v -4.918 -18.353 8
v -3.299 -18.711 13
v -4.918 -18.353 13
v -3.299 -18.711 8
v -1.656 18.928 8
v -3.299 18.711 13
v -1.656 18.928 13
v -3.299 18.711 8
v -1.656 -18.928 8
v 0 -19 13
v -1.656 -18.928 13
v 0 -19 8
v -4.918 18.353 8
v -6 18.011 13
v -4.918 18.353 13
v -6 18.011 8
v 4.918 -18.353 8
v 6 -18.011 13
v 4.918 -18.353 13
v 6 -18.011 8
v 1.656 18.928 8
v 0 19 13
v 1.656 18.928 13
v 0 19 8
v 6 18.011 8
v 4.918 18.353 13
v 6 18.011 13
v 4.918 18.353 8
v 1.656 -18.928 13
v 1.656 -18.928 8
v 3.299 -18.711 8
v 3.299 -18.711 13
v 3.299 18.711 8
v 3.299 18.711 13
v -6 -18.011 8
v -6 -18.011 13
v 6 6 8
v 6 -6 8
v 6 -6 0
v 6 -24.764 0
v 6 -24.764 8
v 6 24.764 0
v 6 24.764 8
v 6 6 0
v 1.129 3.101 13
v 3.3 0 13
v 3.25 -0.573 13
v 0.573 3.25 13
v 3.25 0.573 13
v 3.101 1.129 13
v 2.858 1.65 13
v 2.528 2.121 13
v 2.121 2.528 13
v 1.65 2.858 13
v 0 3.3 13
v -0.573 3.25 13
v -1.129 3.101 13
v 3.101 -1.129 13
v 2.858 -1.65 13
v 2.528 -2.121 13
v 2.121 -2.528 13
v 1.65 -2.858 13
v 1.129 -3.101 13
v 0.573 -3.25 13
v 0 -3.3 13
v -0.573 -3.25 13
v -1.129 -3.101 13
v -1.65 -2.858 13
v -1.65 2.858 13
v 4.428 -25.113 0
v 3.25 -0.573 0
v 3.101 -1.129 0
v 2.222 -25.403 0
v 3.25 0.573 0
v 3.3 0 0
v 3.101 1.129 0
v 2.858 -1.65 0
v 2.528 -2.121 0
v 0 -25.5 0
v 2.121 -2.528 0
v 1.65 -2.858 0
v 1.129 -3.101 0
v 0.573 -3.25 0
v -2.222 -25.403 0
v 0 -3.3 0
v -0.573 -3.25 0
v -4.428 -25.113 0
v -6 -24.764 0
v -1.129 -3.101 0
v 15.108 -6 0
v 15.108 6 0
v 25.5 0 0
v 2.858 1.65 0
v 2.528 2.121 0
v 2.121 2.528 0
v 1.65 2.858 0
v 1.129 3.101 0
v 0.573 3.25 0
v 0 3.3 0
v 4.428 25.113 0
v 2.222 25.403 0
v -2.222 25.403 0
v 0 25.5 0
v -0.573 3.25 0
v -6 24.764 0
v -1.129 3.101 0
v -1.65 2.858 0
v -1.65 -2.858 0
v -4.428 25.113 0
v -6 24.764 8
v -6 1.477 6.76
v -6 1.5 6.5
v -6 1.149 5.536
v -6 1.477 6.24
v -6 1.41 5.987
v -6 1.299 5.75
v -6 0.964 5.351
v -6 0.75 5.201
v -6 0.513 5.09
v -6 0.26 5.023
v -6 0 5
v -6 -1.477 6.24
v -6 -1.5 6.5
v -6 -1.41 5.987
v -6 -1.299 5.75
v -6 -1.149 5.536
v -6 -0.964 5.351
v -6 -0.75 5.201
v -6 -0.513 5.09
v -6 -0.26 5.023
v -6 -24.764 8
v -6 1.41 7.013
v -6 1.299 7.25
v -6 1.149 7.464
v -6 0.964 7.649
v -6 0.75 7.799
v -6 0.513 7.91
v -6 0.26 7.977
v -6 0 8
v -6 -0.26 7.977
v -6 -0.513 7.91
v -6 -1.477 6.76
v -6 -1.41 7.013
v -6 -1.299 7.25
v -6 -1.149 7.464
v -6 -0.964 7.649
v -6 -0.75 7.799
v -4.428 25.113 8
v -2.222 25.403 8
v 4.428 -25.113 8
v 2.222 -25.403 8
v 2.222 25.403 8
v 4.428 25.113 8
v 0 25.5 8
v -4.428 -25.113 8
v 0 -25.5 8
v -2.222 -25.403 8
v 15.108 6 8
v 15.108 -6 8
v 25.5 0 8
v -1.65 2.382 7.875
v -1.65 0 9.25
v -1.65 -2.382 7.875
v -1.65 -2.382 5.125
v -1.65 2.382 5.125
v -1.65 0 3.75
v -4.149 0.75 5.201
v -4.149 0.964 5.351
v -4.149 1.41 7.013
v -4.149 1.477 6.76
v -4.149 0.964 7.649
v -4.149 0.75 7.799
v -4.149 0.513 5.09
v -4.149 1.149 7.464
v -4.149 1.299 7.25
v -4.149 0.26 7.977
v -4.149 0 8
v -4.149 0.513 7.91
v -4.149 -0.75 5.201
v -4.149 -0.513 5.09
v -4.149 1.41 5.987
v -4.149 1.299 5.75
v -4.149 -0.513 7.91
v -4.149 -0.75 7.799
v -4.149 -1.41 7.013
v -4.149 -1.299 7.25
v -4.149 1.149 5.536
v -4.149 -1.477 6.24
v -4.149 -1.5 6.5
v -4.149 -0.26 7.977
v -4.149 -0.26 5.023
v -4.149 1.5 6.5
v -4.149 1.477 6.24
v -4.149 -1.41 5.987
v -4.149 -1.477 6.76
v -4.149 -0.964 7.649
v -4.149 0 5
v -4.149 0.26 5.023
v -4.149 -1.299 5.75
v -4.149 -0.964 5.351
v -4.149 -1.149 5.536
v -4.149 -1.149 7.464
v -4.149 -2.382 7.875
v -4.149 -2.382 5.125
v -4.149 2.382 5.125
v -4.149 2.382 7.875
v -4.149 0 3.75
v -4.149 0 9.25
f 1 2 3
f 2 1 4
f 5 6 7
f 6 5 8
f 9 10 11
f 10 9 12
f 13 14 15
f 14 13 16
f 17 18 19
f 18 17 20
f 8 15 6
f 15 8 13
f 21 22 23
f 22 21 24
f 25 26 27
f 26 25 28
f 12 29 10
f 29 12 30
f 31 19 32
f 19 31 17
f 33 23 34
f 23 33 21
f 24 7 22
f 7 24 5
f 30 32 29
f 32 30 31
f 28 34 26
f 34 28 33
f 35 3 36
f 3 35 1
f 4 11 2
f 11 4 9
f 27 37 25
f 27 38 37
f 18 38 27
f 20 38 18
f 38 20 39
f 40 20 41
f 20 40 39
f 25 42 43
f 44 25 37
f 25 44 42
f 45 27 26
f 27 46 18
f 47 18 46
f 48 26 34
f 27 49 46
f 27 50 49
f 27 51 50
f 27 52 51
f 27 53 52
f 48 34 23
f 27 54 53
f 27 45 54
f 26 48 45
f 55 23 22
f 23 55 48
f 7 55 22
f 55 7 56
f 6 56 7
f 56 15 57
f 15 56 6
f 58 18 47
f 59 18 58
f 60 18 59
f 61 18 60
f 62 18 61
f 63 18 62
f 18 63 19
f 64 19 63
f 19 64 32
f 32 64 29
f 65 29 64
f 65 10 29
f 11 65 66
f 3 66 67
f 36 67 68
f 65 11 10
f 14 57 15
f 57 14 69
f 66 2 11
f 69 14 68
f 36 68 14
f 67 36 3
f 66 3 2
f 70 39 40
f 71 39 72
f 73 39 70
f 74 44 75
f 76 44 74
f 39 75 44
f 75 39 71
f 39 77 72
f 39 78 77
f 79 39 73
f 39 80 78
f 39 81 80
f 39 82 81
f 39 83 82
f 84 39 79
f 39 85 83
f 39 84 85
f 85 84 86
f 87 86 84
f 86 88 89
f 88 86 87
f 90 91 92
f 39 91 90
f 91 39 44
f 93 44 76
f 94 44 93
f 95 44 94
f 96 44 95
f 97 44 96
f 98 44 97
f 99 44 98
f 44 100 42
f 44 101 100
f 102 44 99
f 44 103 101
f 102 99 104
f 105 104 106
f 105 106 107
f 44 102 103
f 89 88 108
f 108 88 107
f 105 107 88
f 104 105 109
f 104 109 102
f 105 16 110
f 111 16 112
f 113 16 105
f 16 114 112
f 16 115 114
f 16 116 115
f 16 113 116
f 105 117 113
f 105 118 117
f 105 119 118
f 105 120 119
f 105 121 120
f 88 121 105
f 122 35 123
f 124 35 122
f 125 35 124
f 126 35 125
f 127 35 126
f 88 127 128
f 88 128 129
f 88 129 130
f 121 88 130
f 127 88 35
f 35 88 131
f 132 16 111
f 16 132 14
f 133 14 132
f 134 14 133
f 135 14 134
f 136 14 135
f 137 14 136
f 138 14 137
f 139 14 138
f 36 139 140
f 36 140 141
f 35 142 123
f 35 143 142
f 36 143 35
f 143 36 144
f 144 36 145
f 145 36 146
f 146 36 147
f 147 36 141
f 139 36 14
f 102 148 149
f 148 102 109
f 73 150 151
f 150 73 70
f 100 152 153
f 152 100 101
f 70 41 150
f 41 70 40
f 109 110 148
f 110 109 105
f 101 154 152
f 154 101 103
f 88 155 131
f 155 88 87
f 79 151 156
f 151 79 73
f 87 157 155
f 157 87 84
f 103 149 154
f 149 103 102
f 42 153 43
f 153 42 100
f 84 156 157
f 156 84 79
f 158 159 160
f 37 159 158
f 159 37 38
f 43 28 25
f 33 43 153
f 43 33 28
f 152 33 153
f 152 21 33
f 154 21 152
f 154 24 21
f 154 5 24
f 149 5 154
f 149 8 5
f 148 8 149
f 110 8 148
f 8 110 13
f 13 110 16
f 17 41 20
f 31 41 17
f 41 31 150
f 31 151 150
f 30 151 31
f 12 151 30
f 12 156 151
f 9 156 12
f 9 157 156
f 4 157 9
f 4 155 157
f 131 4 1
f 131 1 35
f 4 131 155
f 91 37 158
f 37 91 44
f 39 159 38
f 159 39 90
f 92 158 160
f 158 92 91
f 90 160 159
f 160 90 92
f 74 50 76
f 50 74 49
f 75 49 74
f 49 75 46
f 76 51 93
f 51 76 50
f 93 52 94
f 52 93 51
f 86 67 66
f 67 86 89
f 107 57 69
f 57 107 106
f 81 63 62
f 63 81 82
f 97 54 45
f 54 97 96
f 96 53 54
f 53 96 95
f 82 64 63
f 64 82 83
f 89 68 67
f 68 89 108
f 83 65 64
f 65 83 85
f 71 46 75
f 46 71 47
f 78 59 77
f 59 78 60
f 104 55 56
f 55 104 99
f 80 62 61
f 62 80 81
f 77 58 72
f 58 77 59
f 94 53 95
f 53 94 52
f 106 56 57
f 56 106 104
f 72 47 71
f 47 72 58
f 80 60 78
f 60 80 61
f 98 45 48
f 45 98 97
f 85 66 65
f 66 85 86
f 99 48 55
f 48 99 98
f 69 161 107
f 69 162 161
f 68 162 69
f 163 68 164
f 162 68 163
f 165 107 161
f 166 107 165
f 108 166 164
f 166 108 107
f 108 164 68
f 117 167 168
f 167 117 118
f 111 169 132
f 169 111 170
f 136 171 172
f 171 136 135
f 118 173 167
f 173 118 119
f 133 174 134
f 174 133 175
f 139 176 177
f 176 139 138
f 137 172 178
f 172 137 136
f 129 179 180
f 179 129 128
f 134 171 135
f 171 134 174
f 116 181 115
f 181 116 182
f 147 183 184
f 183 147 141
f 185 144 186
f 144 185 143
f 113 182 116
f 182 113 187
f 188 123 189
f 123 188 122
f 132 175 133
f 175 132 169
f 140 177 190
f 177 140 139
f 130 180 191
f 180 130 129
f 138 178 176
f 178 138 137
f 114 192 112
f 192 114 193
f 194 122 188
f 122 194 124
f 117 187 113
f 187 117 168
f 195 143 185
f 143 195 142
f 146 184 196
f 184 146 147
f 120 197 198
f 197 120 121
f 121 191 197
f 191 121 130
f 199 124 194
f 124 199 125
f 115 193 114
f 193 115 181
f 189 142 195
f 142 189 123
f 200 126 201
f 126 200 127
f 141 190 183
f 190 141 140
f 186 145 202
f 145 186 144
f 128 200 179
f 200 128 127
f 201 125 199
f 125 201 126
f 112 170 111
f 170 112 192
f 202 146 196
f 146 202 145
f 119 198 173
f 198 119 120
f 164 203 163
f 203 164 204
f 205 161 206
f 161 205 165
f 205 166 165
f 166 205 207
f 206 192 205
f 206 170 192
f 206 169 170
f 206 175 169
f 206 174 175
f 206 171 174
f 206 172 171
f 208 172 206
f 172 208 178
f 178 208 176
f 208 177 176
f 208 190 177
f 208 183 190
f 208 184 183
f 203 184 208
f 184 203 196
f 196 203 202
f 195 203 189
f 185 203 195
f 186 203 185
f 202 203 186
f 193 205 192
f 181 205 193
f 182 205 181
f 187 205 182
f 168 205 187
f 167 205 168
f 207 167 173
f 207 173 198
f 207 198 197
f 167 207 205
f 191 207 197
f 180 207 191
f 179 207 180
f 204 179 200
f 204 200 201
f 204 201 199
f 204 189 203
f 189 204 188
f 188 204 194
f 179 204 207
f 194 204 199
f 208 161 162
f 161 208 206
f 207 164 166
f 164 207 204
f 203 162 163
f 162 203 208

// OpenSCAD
// Oven control

// Copyright (C) 2019 Jeremy Bennett <www.jeremybennett.com>

// Contributor: Jeremy Bennett <jeremy.bennett@embecosm.com>

// This file is licensed under the Creative Commons Attribution-ShareAlike 3.0
// Unported License. To view a copy of this license, visit
// http://creativecommons.org/licenses/by-sa/3.0/ or send a letter to Creative
// Commons, PO Box 1866, Mountain View, CA 94042, USA.


// A replacement oven controller


// Very small value
EPS = 0.001;

// Very large value
INF = 100;

// M3 dimensions
M3_SCREW_D = 3.0;
M3_NUT_D = 5.5;
M3_NUT_H = 2.5;


// Hole for D fitting of radius r
module d_hole (r) {
     intersection () {
	  cylinder (r = r, h = INF * 2, center = true, $fn = 36);
	  translate (v = [r / 2, 0, 0])
	       cube (size = [r * 2, r * 2, INF * 2 + EPS], center = true);
     }
}


// Grub screw hole, screw diameter d_screw, nut diameter d_nut and nut height
// h_nut and offsets from the center of x_off and base of z_off.
module grub_hole (d_screw, d_nut, h_nut, x_off, z_off) {
     r_screw = d_screw / 2;
     r_nut = d_nut / 2;
     translate (v = [0, 0, z_off])
	  rotate (a = [0, -90, 0])
	      cylinder (r = r_screw, h = INF, center = false, $fn = 36);
     translate (v = [-x_off, 0, z_off])
	  rotate (a = [0, -90, 0])
	      cylinder (r = r_nut, h = h_nut, center = false, $fn = 6);
}


// Bar and bush of radius r, height h, inner bar length l_i and outer bar
// length l_o
module bar_bush(r, h, l_i, l_o, h_spring) {
     cylinder (r = r, h = h, center = false, $fn = 36);
     intersection () {
	  cylinder (r = l_i / 2, h = INF, center = true, $fn = 72);
	  translate (v = [-r, -INF / 2, 0])
	       cube (size = [r * 2, INF, h], center = false);
     }
     intersection () {
	  cylinder (r = l_o / 2, h = INF, center = true, $fn = 72);
	  translate (v = [-r, -INF / 2, 0])
	       cube (size = [r * 2, INF, h - h_spring], center = false);
     }
     intersection () {
	  translate (v = [0, -r, 0])
	       cube (size = [INF, r * 2, h - h_spring], center = false);
	  translate (v = [-l_o / 2, 0, 0])
		    cylinder (r = l_o, h = INF, center = true, $fn = 3);
     }
}


// Central bush of height h and radius r_main, with D fitting of radius r_d,
// inner bar of length l_i and outer bar of l_o
module fitting (h, r_main, r_d, grub_off, l_i, l_o, h_spring) {
     difference () {
	  bar_bush (r = r_main, h = h, l_i = l_i, l_o = l_o,
		    h_spring = h_spring);
	  d_hole (r = r_d);
	  grub_hole (d_screw = M3_SCREW_D, d_nut = M3_NUT_D, h_nut = M3_NUT_H,
		     x_off = r_d / 2 - EPS, z_off = grub_off);
     }
}


// The fitting
fitting (h = 13, r_main = 6, r_d = 3.3, grub_off = 13 - 6.5, l_i = 38, l_o = 51,
	 h_spring = 5);
